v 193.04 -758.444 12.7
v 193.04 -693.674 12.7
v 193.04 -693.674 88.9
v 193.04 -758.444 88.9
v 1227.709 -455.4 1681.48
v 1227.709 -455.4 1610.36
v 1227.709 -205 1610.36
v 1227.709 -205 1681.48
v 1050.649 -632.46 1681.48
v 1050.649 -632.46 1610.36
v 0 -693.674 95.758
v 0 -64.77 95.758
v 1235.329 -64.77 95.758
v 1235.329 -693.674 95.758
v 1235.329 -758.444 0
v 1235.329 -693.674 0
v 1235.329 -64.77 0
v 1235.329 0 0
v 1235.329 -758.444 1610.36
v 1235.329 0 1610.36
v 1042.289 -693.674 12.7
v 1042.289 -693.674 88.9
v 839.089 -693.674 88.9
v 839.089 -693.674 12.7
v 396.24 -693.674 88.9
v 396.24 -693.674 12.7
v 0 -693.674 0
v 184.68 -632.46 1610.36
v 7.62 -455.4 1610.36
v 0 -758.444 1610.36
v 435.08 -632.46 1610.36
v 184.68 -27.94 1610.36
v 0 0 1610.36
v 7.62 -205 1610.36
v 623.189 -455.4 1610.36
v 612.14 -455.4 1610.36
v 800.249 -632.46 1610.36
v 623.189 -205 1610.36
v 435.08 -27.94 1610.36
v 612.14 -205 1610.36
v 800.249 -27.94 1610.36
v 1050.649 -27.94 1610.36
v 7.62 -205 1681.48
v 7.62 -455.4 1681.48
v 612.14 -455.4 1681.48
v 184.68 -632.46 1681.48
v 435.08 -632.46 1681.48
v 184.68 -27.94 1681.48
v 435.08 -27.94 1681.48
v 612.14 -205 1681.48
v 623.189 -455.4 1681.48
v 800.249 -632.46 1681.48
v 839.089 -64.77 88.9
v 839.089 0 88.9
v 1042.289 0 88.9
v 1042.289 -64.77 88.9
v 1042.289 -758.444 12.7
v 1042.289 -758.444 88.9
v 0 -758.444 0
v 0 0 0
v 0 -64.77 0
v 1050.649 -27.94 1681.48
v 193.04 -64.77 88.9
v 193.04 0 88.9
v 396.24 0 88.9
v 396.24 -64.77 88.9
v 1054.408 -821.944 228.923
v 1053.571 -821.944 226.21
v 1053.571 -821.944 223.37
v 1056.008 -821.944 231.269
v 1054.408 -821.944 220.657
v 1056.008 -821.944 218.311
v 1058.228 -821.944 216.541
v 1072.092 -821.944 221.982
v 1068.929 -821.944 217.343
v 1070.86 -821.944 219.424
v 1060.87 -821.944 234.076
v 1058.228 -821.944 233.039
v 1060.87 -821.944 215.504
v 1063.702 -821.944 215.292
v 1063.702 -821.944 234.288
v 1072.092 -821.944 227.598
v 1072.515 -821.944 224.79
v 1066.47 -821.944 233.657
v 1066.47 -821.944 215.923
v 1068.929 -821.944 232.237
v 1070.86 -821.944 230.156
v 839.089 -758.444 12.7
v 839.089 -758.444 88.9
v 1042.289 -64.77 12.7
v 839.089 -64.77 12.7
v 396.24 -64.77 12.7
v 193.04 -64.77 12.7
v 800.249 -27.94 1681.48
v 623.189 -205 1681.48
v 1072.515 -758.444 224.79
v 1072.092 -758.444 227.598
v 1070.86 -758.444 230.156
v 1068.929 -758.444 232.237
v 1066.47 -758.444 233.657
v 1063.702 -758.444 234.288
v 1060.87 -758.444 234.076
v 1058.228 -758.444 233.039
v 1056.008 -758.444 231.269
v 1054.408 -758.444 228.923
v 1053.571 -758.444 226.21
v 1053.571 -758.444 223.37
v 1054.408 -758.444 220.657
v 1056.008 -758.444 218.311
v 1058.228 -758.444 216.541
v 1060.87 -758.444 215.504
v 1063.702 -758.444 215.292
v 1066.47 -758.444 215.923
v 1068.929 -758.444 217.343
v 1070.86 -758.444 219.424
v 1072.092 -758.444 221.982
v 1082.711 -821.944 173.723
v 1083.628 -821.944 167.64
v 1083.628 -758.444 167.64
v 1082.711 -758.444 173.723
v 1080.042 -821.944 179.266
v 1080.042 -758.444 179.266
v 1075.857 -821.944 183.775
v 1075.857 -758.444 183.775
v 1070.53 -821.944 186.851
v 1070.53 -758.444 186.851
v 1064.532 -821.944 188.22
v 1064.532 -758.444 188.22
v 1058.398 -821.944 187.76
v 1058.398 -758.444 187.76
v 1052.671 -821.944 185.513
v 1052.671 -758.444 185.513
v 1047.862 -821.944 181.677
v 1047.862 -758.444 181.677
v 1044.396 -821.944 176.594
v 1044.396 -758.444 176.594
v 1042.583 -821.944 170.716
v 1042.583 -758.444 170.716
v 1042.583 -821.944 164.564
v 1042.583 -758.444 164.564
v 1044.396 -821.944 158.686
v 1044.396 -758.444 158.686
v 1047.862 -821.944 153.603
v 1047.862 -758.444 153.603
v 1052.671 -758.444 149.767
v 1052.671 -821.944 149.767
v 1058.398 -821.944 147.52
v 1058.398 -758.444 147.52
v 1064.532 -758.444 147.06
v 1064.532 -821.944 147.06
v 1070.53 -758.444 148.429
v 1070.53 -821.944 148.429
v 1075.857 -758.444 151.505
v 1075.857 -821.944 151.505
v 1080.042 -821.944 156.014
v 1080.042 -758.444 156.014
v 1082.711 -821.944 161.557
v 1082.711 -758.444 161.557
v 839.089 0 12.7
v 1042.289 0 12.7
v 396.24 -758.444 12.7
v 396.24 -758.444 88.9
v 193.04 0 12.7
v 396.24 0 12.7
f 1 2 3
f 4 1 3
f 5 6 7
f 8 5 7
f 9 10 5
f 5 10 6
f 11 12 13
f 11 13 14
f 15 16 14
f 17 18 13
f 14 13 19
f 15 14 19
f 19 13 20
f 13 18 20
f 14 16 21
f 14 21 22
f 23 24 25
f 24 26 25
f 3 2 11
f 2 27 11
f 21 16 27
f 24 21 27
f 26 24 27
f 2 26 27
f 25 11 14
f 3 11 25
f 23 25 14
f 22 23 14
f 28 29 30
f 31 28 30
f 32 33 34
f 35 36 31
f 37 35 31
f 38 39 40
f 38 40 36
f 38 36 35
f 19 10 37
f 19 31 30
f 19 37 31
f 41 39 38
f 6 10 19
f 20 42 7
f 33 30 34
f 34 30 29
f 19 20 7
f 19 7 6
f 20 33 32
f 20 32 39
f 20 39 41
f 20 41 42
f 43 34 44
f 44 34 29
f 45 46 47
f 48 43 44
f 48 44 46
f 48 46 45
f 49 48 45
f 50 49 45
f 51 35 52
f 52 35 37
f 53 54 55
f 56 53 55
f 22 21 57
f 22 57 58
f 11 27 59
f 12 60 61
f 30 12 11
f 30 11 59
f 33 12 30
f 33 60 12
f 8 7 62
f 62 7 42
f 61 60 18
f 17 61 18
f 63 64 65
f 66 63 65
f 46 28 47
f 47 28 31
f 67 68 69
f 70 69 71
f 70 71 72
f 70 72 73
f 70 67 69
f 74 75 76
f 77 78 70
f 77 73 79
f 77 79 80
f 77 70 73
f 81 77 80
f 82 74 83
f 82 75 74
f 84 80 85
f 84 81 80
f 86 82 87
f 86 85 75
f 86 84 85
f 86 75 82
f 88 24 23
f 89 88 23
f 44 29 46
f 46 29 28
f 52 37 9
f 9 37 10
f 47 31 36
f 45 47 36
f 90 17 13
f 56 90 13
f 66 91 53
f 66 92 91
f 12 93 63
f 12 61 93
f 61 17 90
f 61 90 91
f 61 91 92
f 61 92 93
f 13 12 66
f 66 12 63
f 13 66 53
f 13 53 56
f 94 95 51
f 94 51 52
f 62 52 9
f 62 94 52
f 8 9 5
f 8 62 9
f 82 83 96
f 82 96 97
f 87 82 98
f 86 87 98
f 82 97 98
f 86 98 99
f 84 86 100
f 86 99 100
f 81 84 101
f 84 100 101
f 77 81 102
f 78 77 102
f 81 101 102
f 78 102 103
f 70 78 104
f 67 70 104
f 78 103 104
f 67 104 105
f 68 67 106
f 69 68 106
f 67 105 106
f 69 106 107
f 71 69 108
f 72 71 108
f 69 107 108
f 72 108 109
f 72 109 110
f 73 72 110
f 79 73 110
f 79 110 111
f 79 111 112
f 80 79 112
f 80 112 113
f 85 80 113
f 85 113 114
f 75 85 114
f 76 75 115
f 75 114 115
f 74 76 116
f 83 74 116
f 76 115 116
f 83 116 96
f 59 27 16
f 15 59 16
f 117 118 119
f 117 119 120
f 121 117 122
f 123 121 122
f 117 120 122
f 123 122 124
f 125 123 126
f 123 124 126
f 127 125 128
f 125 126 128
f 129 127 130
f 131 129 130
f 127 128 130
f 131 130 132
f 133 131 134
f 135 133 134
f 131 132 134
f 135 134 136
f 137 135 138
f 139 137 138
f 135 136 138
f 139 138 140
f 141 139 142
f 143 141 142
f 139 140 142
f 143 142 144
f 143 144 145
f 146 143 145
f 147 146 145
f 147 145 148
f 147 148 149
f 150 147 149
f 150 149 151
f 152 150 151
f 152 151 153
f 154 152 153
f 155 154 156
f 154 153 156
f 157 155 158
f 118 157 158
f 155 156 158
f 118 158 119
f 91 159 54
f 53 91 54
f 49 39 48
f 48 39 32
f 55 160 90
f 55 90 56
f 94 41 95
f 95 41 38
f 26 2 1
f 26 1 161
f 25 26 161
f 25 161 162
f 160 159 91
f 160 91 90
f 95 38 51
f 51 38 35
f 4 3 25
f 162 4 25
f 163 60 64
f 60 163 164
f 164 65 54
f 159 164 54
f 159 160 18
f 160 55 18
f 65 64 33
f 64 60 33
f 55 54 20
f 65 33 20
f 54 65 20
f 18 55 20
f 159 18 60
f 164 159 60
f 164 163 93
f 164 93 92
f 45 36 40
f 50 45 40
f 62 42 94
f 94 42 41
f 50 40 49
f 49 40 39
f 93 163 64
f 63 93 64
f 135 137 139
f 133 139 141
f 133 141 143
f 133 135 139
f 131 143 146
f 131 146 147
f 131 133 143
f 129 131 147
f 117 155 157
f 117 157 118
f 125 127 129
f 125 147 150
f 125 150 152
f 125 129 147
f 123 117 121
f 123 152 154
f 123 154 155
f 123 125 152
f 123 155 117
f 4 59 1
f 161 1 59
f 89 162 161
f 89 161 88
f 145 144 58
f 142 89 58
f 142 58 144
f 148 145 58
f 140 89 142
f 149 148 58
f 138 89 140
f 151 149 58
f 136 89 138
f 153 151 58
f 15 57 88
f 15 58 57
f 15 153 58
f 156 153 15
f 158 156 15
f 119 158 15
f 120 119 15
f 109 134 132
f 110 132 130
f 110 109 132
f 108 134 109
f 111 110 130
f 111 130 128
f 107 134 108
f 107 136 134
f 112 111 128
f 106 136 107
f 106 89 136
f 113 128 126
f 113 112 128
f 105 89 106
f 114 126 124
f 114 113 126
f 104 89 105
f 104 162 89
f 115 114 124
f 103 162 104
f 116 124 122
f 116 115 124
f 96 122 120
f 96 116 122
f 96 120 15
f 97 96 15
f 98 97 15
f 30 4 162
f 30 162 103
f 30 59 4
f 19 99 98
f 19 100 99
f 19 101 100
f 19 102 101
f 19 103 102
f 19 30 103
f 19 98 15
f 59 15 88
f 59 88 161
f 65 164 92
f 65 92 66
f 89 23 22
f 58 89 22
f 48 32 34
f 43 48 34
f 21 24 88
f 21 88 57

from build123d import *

# Parameters (mm, degrees)
F0_W     = 1235.329
F0_H     = 1610.36
F0_W_2   = 203.2
F0_H_2   = 76.2
F1_DEPTH = 758.444
F2_W     = 628.904
F2_H     = 203.2
F3_DEPTH = 1235.33
F5_DEPTH = 71.12
F6_R     = 20.6375
F6_R_2   = 9.525
F7_DEPTH = 63.5


with BuildPart() as f1:
    # F0 (on Front) → F1 (new body)
    with BuildSketch(Plane.XZ):
        with Locations((617.6645, 805.18)):
            Rectangle(F0_W, F0_H)
        with Locations((294.64, 50.8)):
            Rectangle(F0_W_2, F0_H_2, mode=Mode.SUBTRACT)
        with Locations((940.689, 50.8)):
            Rectangle(F0_W_2, F0_H_2, mode=Mode.SUBTRACT)
    extrude(amount=F1_DEPTH)

    # F2 (on face) → F3 (cut, through all)
    with BuildSketch(Plane(origin=(0, 0, 0), x_dir=(0, -1, 0), z_dir=(-1, 0, 0))):
        with Locations((379.222, -5.842)):
            Rectangle(F2_W, F2_H)
    extrude(amount=-F3_DEPTH, mode=Mode.SUBTRACT)

    # F4 (on face) → F5 (join)
    with BuildSketch(Plane.XY.offset(1610.36)):
        Polygon((435.080191, -632.46), (612.14, -455.400191), (612.14, -204.999809), (435.080191, -27.94), (184.679809, -27.94), (7.62, -204.999809), (7.62, -455.400191), (184.679809, -632.46), align=None)
        Polygon((1050.649191, -632.46), (1227.709, -455.400191), (1227.709, -204.999809), (1050.649191, -27.94), (800.248809, -27.94), (623.189, -204.999809), (623.189, -455.400191), (800.248809, -632.46), align=None)
    extrude(amount=F5_DEPTH)

    # F6 (on face) → F7 (join)
    with BuildSketch(Plane.XZ.offset(758.444)):
        with Locations((1062.99, 167.64)):
            Circle(F6_R)
        with Locations((1062.99, 224.79)):
            Circle(F6_R_2)
    extrude(amount=F7_DEPTH)


solid = f1.part
